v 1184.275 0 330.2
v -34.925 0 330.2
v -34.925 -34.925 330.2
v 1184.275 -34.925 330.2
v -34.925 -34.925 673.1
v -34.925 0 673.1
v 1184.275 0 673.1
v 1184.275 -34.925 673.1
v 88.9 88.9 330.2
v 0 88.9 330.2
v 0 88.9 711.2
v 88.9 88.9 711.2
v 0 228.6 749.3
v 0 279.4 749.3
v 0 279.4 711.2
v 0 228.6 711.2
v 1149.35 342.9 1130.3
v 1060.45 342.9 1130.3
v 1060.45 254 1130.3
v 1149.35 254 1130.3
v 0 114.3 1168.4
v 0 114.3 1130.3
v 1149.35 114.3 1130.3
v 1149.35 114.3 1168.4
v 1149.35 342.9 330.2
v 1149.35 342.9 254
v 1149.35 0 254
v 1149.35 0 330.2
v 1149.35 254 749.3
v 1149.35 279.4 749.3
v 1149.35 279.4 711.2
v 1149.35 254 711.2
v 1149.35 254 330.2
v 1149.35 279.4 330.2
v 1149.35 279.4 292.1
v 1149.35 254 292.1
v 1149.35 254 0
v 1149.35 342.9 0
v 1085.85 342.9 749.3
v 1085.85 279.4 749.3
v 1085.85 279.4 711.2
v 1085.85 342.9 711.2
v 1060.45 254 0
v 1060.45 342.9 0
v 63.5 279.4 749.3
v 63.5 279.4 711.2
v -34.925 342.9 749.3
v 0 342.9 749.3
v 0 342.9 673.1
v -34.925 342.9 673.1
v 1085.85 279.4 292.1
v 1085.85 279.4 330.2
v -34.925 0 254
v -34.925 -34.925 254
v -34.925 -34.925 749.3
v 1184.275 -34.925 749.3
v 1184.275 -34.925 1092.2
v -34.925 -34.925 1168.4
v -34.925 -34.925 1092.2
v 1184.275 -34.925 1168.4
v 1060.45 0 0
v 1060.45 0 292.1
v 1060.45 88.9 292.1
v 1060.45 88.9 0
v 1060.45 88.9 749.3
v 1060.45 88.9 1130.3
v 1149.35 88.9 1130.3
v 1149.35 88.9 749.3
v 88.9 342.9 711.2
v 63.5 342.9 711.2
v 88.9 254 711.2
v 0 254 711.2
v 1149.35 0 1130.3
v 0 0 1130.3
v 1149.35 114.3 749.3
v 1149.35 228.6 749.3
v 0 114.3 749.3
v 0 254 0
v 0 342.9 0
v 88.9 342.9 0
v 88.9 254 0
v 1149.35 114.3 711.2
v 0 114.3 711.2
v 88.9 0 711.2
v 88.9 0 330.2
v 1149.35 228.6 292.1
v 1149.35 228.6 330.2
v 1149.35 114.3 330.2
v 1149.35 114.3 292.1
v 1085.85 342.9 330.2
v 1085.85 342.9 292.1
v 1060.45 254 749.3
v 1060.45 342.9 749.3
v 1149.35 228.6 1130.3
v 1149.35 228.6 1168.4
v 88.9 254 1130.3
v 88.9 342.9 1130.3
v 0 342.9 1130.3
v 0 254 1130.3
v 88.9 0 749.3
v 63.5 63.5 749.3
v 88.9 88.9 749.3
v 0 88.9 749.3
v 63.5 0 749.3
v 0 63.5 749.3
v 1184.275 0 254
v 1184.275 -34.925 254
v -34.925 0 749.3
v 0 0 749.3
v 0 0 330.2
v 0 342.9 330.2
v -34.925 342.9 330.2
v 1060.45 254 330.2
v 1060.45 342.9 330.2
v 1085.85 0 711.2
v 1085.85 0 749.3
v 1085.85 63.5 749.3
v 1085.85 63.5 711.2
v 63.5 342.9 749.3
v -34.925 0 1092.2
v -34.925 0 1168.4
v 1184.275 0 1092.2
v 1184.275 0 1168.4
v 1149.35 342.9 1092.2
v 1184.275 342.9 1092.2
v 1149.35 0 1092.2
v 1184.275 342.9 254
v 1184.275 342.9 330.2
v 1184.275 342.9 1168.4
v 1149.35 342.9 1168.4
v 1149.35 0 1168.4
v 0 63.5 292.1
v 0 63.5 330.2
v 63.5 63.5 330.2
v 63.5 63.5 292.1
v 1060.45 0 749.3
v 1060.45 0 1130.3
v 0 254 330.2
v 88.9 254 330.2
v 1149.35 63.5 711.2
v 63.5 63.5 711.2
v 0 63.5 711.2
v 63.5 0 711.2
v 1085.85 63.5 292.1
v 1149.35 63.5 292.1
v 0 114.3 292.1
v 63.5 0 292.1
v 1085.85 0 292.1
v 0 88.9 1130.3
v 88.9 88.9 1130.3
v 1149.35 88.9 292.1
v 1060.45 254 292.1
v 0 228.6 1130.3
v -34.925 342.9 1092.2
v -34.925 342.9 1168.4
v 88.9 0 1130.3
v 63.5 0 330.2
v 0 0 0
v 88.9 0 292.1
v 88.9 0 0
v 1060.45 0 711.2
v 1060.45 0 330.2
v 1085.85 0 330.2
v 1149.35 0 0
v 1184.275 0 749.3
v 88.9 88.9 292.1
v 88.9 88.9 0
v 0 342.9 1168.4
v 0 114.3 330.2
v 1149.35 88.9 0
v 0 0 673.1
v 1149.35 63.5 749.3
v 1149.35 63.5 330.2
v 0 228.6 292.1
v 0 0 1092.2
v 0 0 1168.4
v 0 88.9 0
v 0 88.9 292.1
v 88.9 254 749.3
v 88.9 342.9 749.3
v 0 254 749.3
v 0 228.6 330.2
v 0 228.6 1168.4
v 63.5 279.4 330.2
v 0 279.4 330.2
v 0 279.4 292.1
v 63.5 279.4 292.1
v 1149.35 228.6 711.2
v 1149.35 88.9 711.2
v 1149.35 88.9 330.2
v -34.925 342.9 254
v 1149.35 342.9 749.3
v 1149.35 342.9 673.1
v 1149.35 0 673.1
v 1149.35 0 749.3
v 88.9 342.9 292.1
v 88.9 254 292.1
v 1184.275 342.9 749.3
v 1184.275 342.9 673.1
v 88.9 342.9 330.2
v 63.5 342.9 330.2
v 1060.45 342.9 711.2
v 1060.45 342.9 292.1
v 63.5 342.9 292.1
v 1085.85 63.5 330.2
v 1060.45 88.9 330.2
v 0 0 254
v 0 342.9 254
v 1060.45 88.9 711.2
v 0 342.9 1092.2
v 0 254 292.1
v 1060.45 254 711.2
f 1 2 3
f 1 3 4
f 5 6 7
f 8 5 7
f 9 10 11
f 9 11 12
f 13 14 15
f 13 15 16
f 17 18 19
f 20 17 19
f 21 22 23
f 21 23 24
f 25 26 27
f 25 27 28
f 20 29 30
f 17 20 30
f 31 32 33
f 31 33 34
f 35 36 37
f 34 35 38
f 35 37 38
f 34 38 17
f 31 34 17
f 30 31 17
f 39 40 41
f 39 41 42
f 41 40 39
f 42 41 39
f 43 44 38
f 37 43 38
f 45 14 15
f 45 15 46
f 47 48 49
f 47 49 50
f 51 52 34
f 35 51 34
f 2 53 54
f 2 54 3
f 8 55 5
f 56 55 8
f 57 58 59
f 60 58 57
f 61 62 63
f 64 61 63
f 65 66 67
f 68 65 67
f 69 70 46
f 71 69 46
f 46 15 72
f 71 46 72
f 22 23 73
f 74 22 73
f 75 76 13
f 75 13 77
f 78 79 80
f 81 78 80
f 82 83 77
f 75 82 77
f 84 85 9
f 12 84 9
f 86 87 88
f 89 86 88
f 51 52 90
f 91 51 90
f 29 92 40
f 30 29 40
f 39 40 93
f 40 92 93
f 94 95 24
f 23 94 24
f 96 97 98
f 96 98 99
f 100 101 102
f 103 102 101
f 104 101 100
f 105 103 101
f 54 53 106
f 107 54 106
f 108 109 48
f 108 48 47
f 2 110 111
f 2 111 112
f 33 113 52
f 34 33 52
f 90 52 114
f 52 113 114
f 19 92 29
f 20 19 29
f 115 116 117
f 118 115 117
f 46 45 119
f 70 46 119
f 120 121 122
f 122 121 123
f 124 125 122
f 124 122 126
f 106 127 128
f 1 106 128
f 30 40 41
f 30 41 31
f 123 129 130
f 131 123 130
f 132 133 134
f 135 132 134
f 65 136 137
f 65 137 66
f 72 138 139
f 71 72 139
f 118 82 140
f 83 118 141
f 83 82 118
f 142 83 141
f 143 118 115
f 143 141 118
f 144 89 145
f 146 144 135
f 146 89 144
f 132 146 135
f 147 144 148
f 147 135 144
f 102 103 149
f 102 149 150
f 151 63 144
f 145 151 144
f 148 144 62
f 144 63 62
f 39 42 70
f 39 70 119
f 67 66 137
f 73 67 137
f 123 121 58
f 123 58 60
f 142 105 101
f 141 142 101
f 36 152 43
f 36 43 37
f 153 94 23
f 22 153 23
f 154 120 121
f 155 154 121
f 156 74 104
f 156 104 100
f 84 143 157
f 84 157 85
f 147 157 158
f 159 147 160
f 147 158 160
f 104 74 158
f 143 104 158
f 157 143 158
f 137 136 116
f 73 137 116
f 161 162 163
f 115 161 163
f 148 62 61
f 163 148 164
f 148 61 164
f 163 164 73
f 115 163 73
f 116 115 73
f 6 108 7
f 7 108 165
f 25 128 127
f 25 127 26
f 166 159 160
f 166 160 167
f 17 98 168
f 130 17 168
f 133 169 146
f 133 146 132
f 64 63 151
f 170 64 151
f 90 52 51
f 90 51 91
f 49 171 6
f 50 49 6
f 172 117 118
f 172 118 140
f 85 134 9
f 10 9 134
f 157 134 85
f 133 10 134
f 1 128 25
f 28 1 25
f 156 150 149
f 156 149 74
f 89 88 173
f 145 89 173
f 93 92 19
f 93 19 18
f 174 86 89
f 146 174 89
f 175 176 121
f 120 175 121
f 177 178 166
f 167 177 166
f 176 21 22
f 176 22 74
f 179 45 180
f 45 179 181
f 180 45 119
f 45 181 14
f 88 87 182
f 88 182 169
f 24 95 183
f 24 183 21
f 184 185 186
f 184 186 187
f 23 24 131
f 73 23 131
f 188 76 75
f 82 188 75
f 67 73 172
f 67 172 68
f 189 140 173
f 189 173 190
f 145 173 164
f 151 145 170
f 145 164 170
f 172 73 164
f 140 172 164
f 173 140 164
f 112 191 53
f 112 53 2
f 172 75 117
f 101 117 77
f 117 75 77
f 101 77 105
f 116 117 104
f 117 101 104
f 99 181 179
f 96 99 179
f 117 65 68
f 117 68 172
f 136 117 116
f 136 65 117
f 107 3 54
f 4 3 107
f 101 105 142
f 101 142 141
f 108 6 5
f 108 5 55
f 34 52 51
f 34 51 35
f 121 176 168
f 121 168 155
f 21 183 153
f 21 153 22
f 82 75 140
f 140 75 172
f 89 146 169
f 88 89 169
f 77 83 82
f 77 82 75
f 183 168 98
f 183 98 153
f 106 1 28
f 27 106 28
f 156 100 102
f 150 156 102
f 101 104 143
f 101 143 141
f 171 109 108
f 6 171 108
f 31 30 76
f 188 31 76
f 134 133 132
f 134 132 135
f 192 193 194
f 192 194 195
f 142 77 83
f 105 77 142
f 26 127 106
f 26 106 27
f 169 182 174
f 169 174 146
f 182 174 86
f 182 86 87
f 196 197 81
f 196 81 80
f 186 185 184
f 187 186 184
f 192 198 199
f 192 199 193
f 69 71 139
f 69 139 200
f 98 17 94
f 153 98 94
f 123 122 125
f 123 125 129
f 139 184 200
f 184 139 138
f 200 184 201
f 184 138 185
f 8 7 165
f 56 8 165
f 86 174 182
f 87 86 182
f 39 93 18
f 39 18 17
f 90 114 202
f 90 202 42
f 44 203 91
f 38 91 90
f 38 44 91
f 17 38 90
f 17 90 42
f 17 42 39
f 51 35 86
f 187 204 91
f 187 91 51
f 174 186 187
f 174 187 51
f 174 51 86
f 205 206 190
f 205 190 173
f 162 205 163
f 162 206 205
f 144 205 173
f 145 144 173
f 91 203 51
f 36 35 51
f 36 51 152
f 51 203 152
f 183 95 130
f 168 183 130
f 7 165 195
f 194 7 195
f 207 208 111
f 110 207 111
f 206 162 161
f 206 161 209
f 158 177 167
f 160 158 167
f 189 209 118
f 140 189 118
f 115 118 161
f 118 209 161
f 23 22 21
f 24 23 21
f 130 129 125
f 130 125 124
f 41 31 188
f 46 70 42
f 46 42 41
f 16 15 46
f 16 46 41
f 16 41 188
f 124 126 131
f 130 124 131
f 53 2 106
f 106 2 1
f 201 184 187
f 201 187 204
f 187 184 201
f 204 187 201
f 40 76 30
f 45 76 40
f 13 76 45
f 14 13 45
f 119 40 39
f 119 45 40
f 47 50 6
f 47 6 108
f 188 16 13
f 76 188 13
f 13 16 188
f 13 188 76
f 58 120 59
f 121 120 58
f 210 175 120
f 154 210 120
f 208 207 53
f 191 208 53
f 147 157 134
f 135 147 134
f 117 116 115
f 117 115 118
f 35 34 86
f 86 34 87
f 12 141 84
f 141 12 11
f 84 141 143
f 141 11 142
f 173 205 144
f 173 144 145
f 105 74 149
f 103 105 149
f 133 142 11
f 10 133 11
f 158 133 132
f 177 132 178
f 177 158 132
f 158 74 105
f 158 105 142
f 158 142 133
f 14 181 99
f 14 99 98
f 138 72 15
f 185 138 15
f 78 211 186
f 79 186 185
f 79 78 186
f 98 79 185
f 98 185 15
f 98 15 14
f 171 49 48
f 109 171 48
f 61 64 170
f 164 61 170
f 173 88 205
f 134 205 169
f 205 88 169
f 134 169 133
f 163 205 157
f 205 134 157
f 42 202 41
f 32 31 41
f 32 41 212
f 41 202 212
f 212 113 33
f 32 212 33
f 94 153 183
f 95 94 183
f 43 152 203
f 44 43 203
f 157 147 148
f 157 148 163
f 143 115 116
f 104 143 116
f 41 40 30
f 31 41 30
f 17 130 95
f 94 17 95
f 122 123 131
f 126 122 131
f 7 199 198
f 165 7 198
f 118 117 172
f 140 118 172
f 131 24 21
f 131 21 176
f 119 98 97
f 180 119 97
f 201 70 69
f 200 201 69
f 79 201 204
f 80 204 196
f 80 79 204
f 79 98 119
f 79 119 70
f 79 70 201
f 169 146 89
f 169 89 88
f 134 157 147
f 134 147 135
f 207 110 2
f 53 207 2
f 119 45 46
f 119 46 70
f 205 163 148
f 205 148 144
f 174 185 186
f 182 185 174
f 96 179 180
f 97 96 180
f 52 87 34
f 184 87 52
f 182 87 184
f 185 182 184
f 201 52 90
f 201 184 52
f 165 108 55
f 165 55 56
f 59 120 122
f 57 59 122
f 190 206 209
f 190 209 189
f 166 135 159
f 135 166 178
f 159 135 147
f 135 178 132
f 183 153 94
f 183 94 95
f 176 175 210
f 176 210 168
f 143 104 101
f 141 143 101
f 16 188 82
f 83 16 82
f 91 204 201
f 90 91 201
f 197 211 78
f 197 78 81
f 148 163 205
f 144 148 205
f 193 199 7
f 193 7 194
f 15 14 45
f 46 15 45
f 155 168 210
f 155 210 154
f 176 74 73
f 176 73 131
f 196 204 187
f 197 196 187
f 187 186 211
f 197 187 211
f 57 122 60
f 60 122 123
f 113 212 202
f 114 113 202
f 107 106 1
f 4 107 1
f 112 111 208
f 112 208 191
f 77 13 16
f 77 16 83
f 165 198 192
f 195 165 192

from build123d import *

# Parameters (mm, degrees)
F0_W      = 88.9
F0_H      = 88.9
F1_DEPTH  = 1168.4
F2_W      = 25.4
F2_H      = 38.1
F2_W_2    = 88.9
F3_DEPTH  = 1149.35
F2_W_3    = 114.3
F4_DEPTH  = 1149.35
F5_W      = 63.5
F5_H      = 63.5
F6_DEPTH  = 1168.401
F8_W      = 34.925
F8_H      = 76.2
F9_DEPTH  = 342.9
F10_W     = 1219.2
F10_H     = 76.2
F11_DEPTH = 34.925


with BuildPart() as f1:
    # F0 (on Top) → F1 (new body)
    with BuildSketch(Plane.XY):
        with Locations((44.45, 44.45)):
            Rectangle(F0_W, F0_H)
    extrude(amount=F1_DEPTH)


with BuildPart() as f1b:
    # F0 (on Top) → F1, piece 2 (new body)
    with BuildSketch(Plane.XY):
        with Locations((1104.9, 44.45)):
            Rectangle(F0_W, F0_H)
    extrude(amount=F1_DEPTH)


with BuildPart() as f1c:
    # F0 (on Top) → F1, piece 3 (new body)
    with BuildSketch(Plane.XY):
        with Locations((44.45, 298.45)):
            Rectangle(F0_W, F0_H)
    extrude(amount=F1_DEPTH)


with BuildPart() as f1d:
    # F0 (on Top) → F1, piece 4 (new body)
    with BuildSketch(Plane.XY):
        with Locations((1104.9, 298.45)):
            Rectangle(F0_W, F0_H)
    extrude(amount=F1_DEPTH)


with BuildPart() as f3:
    # F2 (on face) → F3 (new body, through all)
    with BuildSketch(Plane(origin=(0, 0, 0), x_dir=(0, -1, 0), z_dir=(-1, 0, 0))):
        with Locations((-241.3, 1149.35)):
            Rectangle(F2_W, F2_H)
        with Locations((-298.45, 1149.35)):
            Rectangle(F2_W_2, F2_H)
    extrude(amount=-F3_DEPTH)


with BuildPart() as f3b:
    # F2 (on face) → F3, piece 2 (new body, through all)
    with BuildSketch(Plane(origin=(0, 0, 0), x_dir=(0, -1, 0), z_dir=(-1, 0, 0))):
        with Locations((-57.15, 1149.35)):
            Rectangle(F2_W_3, F2_H)
    extrude(amount=-F3_DEPTH)


with BuildPart() as f3c:
    # F2 (on face) → F3, piece 3 (new body, through all)
    with BuildSketch(Plane(origin=(0, 0, 0), x_dir=(0, -1, 0), z_dir=(-1, 0, 0))):
        with Locations((-298.45, 730.25)):
            Rectangle(F2_W_2, F2_H)
        with Locations((-241.3, 730.25)):
            Rectangle(F2_W, F2_H)
    extrude(amount=-F3_DEPTH)


with BuildPart() as f3d:
    # F2 (on face) → F3, piece 4 (new body, through all)
    with BuildSketch(Plane(origin=(0, 0, 0), x_dir=(0, -1, 0), z_dir=(-1, 0, 0))):
        with Locations((-298.45, 311.15)):
            Rectangle(F2_W_2, F2_H)
        with Locations((-241.3, 311.15)):
            Rectangle(F2_W, F2_H)
    extrude(amount=-F3_DEPTH)


with BuildPart() as f3e:
    # F2 (on face) → F3, piece 5 (new body, through all)
    with BuildSketch(Plane(origin=(0, 0, 0), x_dir=(0, -1, 0), z_dir=(-1, 0, 0))):
        with Locations((-57.15, 311.15)):
            Rectangle(F2_W_3, F2_H)
    extrude(amount=-F3_DEPTH)


with BuildPart() as f3f:
    # F2 (on face) → F3, piece 6 (new body, through all)
    with BuildSketch(Plane(origin=(0, 0, 0), x_dir=(0, -1, 0), z_dir=(-1, 0, 0))):
        with Locations((-57.15, 730.25)):
            Rectangle(F2_W_3, F2_H)
    extrude(amount=-F3_DEPTH)


with BuildPart() as f4:
    # F2 (on face) → F4 (new body, through all)
    with BuildSketch(Plane(origin=(0, 0, 0), x_dir=(0, -1, 0), z_dir=(-1, 0, 0))):
        with Locations((-171.45, 1149.35)):
            Rectangle(F2_W_3, F2_H)
    extrude(amount=-F4_DEPTH)


with BuildPart() as f4b:
    # F2 (on face) → F4, piece 2 (new body, through all)
    with BuildSketch(Plane(origin=(0, 0, 0), x_dir=(0, -1, 0), z_dir=(-1, 0, 0))):
        with Locations((-171.45, 730.25)):
            Rectangle(F2_W_3, F2_H)
    extrude(amount=-F4_DEPTH)


with BuildPart() as f4c:
    # F2 (on face) → F4, piece 3 (new body, through all)
    with BuildSketch(Plane(origin=(0, 0, 0), x_dir=(0, -1, 0), z_dir=(-1, 0, 0))):
        with Locations((-171.45, 311.15)):
            Rectangle(F2_W_3, F2_H)
    extrude(amount=-F4_DEPTH)


with BuildPart() as f6_tool:
    # F5 (on face) → F6 (new body, through all)
    with BuildSketch(Plane.XY.offset(1168.4)):
        with Locations((31.75, 31.75)):
            Rectangle(F5_W, F5_H)
        with Locations((1117.6, 31.75)):
            Rectangle(F5_W, F5_H)
        with Locations((1117.6, 311.15)):
            Rectangle(F5_W, F5_H)
        with Locations((31.75, 311.15)):
            Rectangle(F5_W, F5_H)
    extrude(amount=-F6_DEPTH)


with BuildPart() as f3c_1:
    add(f3c.part)

    # F6: cut by f6_tool
    add(f6_tool.part, mode=Mode.SUBTRACT)


with BuildPart() as f3d_1:
    add(f3d.part)

    # F6: cut by f6_tool
    add(f6_tool.part, mode=Mode.SUBTRACT)


with BuildPart() as f3e_1:
    add(f3e.part)

    # F6: cut by f6_tool
    add(f6_tool.part, mode=Mode.SUBTRACT)


with BuildPart() as f3f_1:
    add(f3f.part)

    # F6: cut by f6_tool
    add(f6_tool.part, mode=Mode.SUBTRACT)


with BuildPart() as f1c_1:
    add(f1c.part)

    # F7: cut F3c, F3f, F3d, F3e, F3, F3b
    add(f3c_1.part, mode=Mode.SUBTRACT)
    add(f3f_1.part, mode=Mode.SUBTRACT)
    add(f3d_1.part, mode=Mode.SUBTRACT)
    add(f3e_1.part, mode=Mode.SUBTRACT)
    add(f3.part, mode=Mode.SUBTRACT)
    add(f3b.part, mode=Mode.SUBTRACT)


with BuildPart() as f1_1:
    add(f1.part)

    # F7: cut F3c, F3f, F3d, F3e, F3, F3b
    add(f3c_1.part, mode=Mode.SUBTRACT)
    add(f3f_1.part, mode=Mode.SUBTRACT)
    add(f3d_1.part, mode=Mode.SUBTRACT)
    add(f3e_1.part, mode=Mode.SUBTRACT)
    add(f3.part, mode=Mode.SUBTRACT)
    add(f3b.part, mode=Mode.SUBTRACT)


with BuildPart() as f1d_1:
    add(f1d.part)

    # F7: cut F3c, F3f, F3d, F3e, F3, F3b
    add(f3c_1.part, mode=Mode.SUBTRACT)
    add(f3f_1.part, mode=Mode.SUBTRACT)
    add(f3d_1.part, mode=Mode.SUBTRACT)
    add(f3e_1.part, mode=Mode.SUBTRACT)
    add(f3.part, mode=Mode.SUBTRACT)
    add(f3b.part, mode=Mode.SUBTRACT)


with BuildPart() as f1b_1:
    add(f1b.part)

    # F7: cut F3c, F3f, F3d, F3e, F3, F3b
    add(f3c_1.part, mode=Mode.SUBTRACT)
    add(f3f_1.part, mode=Mode.SUBTRACT)
    add(f3d_1.part, mode=Mode.SUBTRACT)
    add(f3e_1.part, mode=Mode.SUBTRACT)
    add(f3.part, mode=Mode.SUBTRACT)
    add(f3b.part, mode=Mode.SUBTRACT)


with BuildPart() as f9:
    # F8 (on face) → F9 (new body, through all)
    with BuildSketch(Plane(origin=(0, 342.9, 0), x_dir=(-1, 0, 0), z_dir=(0, 1, 0))):
        with Locations((-1166.8125, 1130.3)):
            Rectangle(F8_W, F8_H)
    extrude(amount=-F9_DEPTH)


with BuildPart() as f9b:
    # F8 (on face) → F9, piece 2 (new body, through all)
    with BuildSketch(Plane(origin=(0, 342.9, 0), x_dir=(-1, 0, 0), z_dir=(0, 1, 0))):
        with Locations((-1166.8125, 711.2)):
            Rectangle(F8_W, F8_H)
    extrude(amount=-F9_DEPTH)


with BuildPart() as f9c:
    # F8 (on face) → F9, piece 3 (new body, through all)
    with BuildSketch(Plane(origin=(0, 342.9, 0), x_dir=(-1, 0, 0), z_dir=(0, 1, 0))):
        with Locations((-1166.8125, 292.1)):
            Rectangle(F8_W, F8_H)
    extrude(amount=-F9_DEPTH)


with BuildPart() as f9d:
    # F8 (on face) → F9, piece 4 (new body, through all)
    with BuildSketch(Plane(origin=(0, 342.9, 0), x_dir=(-1, 0, 0), z_dir=(0, 1, 0))):
        with Locations((17.4625, 1130.3)):
            Rectangle(F8_W, F8_H)
    extrude(amount=-F9_DEPTH)


with BuildPart() as f9e:
    # F8 (on face) → F9, piece 5 (new body, through all)
    with BuildSketch(Plane(origin=(0, 342.9, 0), x_dir=(-1, 0, 0), z_dir=(0, 1, 0))):
        with Locations((17.4625, 711.2)):
            Rectangle(F8_W, F8_H)
    extrude(amount=-F9_DEPTH)


with BuildPart() as f9f:
    # F8 (on face) → F9, piece 6 (new body, through all)
    with BuildSketch(Plane(origin=(0, 342.9, 0), x_dir=(-1, 0, 0), z_dir=(0, 1, 0))):
        with Locations((17.4625, 292.1)):
            Rectangle(F8_W, F8_H)
    extrude(amount=-F9_DEPTH)


with BuildPart() as f11:
    # F10 (on face) → F11 (new body)
    with BuildSketch(Plane.XZ):
        with Locations((574.675, 292.1)):
            Rectangle(F10_W, F10_H)
    extrude(amount=F11_DEPTH)


with BuildPart() as f11b:
    # F10 (on face) → F11, piece 2 (new body)
    with BuildSketch(Plane.XZ):
        with Locations((574.675, 711.2)):
            Rectangle(F10_W, F10_H)
    extrude(amount=F11_DEPTH)


with BuildPart() as f11c:
    # F10 (on face) → F11, piece 3 (new body)
    with BuildSketch(Plane.XZ):
        with Locations((574.675, 1130.3)):
            Rectangle(F10_W, F10_H)
    extrude(amount=F11_DEPTH)


solid = Compound([f3.part, f3b.part, f4.part, f4b.part, f4c.part, f3c_1.part, f3d_1.part, f3e_1.part, f3f_1.part, f1c_1.part, f1_1.part, f1d_1.part, f1b_1.part, f9.part, f9b.part, f9c.part, f9d.part, f9e.part, f9f.part, f11.part, f11b.part, f11c.part])
